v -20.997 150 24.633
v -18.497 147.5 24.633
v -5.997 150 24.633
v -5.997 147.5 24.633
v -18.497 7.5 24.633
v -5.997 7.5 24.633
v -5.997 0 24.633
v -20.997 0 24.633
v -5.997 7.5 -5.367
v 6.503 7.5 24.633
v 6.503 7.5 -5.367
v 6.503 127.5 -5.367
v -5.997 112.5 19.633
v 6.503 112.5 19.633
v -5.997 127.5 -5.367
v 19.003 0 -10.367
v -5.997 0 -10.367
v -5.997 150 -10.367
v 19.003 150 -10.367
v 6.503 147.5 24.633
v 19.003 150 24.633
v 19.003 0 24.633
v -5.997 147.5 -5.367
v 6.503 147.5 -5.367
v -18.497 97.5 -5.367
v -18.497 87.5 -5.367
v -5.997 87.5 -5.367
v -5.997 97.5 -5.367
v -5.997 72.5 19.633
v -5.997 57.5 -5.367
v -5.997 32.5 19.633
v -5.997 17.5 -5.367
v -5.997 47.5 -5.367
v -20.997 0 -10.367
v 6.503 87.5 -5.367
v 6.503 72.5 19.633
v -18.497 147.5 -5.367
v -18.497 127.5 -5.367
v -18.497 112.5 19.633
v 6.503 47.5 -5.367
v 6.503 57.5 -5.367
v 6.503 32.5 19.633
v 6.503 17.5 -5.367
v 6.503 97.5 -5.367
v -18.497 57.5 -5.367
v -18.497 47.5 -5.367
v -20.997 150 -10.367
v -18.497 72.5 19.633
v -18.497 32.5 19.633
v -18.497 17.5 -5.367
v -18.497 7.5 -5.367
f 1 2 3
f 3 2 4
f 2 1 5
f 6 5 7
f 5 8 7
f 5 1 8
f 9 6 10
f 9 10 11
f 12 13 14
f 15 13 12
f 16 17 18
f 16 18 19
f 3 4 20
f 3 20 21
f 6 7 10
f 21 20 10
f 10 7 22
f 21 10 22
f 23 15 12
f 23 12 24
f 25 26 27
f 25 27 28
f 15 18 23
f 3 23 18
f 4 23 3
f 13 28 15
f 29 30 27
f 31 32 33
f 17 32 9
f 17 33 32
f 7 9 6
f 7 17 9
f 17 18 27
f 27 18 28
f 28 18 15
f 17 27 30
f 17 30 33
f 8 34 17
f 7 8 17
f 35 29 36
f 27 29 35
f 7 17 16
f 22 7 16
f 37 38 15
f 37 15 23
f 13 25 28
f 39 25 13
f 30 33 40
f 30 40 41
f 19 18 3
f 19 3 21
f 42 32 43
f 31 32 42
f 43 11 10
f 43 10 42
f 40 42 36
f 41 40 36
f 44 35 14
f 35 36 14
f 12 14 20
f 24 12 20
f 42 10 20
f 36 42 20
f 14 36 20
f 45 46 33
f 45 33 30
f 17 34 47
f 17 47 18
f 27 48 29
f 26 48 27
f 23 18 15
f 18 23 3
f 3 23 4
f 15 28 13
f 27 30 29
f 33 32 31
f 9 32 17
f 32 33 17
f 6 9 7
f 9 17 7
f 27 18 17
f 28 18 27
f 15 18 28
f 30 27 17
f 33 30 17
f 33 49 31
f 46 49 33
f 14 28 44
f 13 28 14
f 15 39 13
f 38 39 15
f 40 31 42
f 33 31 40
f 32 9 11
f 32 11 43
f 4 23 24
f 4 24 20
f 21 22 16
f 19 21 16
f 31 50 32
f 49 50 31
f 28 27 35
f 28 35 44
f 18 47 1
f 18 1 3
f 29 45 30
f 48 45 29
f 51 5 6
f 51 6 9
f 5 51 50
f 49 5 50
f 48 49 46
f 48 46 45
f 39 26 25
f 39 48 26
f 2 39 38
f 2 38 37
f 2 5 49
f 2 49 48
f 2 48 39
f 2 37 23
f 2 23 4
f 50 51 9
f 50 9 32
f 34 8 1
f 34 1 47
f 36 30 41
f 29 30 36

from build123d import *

# Parameters (mm, degrees)
SKETCH2_W           = 40
SKETCH2_H           = 35
BOSS_EXTRUDE1_DEPTH = 150
CAVITY1_START       = -18.497067449
CAVITY1_DEPTH       = 25


# Read off the part's stored shape, not the designer's step: Cavity1
with BuildPart() as part:
    # Sketch2 → Boss-Extrude1 (new body)
    with BuildSketch(Plane(origin=(0, 0, 0), x_dir=(1, 0, 0), z_dir=(0, 1, 0))):
        with Locations((-0.997067449, -7.133431085)):
            Rectangle(SKETCH2_W, SKETCH2_H)
    extrude(amount=BOSS_EXTRUDE1_DEPTH)

    # Cavity1 outline → Cavity1 (cut)
    with BuildSketch(Plane.YZ.offset(CAVITY1_START)):
        Polygon((87.5, -5.366568915), (97.5, -5.366568915), (112.5, 19.633431085), (127.5, -5.366568915), (147.5, -5.366568915), (147.5, 24.633431085), (7.5, 24.633431085), (7.5, -5.366568915), (17.5, -5.366568915), (32.5, 19.633431085), (47.5, -5.366568915), (57.5, -5.366568915), (72.5, 19.633431085), align=None)
    extrude(amount=CAVITY1_DEPTH, mode=Mode.SUBTRACT)


with BuildPart() as body_2:
    # Split1: the piece on the far side of the plane
    add(part.part)
    split(bisect_by=Plane(origin=(-5.997067449, 0, 0), x_dir=(0, 0, 1), z_dir=(1, 0, 0)), keep=Keep.BOTTOM)


with BuildPart() as part_1:
    add(part.part)

    # Split1
    split(bisect_by=Plane(origin=(-5.997067449, 0, 0), x_dir=(0, 0, 1), z_dir=(1, 0, 0)), keep=Keep.TOP)


solid = Compound([body_2.part, part_1.part])
